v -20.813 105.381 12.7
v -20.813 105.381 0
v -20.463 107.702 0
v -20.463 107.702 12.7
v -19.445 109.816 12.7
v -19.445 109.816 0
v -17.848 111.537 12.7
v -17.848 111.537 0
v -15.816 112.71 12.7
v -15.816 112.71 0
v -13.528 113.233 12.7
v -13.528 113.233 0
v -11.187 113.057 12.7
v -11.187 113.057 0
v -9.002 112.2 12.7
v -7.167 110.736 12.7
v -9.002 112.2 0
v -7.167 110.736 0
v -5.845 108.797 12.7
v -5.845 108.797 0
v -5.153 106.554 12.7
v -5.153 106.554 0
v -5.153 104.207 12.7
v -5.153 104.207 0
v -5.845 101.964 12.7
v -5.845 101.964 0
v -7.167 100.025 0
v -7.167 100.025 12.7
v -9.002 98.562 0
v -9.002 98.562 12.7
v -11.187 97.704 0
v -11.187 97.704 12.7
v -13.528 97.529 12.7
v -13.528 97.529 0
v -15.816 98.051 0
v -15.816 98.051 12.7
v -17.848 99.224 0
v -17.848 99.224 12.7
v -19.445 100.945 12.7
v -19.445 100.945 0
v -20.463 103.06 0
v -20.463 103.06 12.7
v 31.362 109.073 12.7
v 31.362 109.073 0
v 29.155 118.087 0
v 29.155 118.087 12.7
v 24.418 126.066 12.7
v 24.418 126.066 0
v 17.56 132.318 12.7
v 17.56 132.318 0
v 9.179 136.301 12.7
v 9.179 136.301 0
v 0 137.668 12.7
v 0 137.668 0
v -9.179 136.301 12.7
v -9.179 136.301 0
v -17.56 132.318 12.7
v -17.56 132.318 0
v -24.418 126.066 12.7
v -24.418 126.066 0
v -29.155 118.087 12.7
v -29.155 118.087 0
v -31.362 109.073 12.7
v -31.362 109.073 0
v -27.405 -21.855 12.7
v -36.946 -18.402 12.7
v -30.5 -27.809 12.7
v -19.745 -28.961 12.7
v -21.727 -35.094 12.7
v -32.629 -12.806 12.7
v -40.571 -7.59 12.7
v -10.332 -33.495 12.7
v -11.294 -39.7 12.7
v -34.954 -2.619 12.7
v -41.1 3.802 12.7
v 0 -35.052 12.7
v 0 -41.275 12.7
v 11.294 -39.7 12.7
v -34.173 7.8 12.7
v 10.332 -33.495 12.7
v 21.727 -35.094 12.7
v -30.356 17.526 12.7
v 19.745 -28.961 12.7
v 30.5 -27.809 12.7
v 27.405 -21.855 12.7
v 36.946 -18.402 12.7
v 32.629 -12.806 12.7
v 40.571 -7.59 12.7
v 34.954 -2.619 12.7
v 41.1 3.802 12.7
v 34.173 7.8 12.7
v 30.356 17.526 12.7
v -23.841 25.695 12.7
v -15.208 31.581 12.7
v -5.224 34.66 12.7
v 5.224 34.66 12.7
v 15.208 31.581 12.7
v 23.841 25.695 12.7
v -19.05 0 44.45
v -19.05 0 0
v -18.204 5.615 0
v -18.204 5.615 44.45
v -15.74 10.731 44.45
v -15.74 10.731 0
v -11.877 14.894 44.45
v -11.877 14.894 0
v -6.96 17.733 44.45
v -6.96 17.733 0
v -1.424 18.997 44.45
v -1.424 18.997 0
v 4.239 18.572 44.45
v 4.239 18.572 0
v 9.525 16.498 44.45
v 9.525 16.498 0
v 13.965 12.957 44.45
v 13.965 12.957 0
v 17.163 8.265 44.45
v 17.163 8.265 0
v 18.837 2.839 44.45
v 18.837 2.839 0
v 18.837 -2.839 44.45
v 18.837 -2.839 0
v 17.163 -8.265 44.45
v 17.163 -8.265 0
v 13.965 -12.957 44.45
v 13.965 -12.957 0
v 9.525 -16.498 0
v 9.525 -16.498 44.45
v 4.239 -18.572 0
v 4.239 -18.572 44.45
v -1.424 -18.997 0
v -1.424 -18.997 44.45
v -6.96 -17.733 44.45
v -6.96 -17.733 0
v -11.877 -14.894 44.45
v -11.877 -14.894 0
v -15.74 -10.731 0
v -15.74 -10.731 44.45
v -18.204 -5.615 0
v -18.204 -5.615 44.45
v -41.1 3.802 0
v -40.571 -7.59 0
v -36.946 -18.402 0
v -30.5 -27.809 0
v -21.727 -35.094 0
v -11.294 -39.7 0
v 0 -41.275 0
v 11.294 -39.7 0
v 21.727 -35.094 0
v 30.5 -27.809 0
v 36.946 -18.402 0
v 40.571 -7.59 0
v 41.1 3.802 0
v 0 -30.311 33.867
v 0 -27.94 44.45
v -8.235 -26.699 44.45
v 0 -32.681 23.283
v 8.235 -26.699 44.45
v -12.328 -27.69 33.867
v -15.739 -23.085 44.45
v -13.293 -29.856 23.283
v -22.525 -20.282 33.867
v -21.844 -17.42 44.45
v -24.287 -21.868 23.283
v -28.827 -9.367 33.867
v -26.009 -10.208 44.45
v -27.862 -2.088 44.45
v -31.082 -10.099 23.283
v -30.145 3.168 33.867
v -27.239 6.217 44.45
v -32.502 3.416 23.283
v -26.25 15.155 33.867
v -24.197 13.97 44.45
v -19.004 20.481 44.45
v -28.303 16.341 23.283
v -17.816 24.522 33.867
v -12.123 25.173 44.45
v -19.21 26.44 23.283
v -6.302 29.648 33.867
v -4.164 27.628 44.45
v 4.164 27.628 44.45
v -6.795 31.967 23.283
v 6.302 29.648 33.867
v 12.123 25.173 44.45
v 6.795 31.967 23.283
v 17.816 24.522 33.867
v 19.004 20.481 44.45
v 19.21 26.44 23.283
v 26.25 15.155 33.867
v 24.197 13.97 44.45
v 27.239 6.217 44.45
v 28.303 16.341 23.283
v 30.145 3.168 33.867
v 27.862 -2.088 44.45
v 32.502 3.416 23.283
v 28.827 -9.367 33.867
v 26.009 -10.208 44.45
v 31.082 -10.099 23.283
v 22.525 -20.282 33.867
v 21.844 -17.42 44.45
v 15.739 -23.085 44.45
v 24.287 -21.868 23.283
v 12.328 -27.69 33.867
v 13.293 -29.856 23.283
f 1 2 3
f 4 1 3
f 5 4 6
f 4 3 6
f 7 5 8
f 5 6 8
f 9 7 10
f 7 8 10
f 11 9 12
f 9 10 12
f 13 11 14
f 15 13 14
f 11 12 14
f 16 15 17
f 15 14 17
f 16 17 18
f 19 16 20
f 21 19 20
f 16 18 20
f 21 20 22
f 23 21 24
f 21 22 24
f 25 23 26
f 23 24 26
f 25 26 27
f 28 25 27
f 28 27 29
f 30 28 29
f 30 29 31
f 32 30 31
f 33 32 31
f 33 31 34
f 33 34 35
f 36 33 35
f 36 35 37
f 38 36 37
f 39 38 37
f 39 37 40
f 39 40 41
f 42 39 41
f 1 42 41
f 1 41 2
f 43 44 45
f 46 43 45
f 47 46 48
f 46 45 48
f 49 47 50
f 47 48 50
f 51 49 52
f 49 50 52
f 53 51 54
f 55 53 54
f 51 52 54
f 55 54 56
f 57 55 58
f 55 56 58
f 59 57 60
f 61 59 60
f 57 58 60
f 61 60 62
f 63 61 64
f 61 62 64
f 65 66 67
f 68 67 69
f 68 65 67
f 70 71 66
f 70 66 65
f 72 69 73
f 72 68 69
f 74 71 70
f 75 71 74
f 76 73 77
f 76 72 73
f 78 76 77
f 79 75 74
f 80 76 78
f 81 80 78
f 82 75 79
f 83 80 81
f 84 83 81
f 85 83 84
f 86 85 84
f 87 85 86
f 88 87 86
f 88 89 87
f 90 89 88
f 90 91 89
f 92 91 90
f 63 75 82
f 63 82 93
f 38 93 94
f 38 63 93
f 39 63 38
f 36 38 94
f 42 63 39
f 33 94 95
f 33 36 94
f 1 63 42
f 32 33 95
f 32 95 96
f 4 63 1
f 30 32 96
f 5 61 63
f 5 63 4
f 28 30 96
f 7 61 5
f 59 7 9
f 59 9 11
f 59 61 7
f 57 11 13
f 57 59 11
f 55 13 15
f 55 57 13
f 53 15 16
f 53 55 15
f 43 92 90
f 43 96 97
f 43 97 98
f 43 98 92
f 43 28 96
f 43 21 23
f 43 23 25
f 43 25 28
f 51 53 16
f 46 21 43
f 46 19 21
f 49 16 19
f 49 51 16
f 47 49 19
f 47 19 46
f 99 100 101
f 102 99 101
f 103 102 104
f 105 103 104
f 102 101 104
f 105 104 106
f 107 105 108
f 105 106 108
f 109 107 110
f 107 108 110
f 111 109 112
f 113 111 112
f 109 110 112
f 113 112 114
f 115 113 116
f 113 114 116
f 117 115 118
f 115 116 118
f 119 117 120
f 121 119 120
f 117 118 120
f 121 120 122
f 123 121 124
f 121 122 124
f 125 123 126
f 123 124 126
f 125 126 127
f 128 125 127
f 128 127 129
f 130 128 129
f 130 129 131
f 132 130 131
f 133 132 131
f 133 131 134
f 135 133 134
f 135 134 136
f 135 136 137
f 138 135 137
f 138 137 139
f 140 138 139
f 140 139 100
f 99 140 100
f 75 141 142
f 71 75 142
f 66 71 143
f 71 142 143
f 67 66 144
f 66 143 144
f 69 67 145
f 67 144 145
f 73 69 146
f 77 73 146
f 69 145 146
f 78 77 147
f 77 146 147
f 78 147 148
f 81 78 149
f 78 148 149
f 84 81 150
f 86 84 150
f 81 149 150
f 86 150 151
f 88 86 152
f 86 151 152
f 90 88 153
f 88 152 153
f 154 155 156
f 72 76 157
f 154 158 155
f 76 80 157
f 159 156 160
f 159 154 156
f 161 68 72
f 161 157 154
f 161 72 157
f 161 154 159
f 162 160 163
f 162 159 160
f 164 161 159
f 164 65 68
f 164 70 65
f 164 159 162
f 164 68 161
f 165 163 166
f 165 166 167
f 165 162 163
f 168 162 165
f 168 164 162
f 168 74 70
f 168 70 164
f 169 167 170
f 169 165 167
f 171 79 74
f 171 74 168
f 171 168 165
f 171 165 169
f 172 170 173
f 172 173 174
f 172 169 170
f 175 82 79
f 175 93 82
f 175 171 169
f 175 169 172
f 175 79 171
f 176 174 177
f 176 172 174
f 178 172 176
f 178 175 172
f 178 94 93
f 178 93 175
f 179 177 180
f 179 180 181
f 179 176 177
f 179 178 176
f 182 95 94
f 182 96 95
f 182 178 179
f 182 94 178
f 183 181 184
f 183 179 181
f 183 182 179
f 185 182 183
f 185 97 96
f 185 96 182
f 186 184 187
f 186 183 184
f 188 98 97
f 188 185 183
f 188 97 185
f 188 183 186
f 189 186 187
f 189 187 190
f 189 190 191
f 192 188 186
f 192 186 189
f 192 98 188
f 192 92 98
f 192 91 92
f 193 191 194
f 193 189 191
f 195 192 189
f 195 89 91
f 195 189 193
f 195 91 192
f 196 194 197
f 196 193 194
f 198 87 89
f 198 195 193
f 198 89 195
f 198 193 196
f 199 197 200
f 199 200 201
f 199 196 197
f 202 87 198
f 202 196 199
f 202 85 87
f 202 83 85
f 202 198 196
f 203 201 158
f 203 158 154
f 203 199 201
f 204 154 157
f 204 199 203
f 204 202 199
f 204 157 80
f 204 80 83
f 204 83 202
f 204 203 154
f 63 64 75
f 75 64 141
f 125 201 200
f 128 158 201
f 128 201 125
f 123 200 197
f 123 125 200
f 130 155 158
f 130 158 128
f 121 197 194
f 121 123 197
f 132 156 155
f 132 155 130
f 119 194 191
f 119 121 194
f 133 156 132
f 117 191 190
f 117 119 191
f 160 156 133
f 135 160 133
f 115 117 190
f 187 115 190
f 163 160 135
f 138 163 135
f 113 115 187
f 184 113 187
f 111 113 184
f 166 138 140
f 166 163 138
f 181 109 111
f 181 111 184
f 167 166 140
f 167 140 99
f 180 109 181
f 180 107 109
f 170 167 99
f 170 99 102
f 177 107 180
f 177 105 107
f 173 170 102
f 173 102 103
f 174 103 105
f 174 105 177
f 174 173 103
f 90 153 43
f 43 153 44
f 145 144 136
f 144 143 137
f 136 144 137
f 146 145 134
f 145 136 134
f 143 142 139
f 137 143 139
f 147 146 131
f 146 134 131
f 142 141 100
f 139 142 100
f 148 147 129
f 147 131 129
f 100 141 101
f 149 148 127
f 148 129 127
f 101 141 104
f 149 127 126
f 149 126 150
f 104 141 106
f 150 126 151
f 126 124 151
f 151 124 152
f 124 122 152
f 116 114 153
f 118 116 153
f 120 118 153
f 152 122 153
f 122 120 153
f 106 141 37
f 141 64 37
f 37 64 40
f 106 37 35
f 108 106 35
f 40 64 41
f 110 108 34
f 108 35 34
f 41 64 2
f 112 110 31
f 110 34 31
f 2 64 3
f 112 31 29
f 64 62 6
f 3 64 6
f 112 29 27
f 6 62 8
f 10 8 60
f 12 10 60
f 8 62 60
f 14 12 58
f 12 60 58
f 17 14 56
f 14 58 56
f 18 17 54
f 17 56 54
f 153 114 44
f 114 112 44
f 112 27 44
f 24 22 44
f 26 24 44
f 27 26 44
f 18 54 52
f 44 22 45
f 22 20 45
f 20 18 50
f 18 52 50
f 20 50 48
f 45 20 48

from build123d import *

# Parameters (mm, degrees)
F1_DEPTH = 12.7
F5_D     = 38.1
F7_D     = 15.748


with BuildPart() as f1:
    # F0 (on Top) → F1 (new body)
    with BuildSketch(Plane.XY):
        with BuildLine():
            Line((-31.362119, 109.072947), (-41.099551, 3.801645))
            ThreePointArc((-41.099551, 3.801645), (0, -41.275), (41.099551, 3.801645))
            Line((41.099551, 3.801645), (31.362119, 109.072947))
            ThreePointArc((31.362119, 109.072947), (0, 137.668), (-31.362119, 109.072947))
        make_face()
    extrude(amount=F1_DEPTH)

    # F2 (on Right) → F3 (revolve)
    with BuildSketch(Plane.YZ):
        Polygon((-27.94, 44.45), (-35.052, 12.7), (0, 12.7), (0, 44.45), align=None)
    revolve(axis=Axis((0, 0, 28.575), (0, 0, -1)))

    # F5 (through all)
    with Locations(Plane.XY.offset(44.45)):
        with Locations((0, 0)):
            Hole(F5_D / 2)

    # F7 (through all)
    with Locations(Plane.XY.offset(12.7)):
        with Locations((-12.939112, 105.38061)):
            Hole(F7_D / 2)


solid = f1.part
